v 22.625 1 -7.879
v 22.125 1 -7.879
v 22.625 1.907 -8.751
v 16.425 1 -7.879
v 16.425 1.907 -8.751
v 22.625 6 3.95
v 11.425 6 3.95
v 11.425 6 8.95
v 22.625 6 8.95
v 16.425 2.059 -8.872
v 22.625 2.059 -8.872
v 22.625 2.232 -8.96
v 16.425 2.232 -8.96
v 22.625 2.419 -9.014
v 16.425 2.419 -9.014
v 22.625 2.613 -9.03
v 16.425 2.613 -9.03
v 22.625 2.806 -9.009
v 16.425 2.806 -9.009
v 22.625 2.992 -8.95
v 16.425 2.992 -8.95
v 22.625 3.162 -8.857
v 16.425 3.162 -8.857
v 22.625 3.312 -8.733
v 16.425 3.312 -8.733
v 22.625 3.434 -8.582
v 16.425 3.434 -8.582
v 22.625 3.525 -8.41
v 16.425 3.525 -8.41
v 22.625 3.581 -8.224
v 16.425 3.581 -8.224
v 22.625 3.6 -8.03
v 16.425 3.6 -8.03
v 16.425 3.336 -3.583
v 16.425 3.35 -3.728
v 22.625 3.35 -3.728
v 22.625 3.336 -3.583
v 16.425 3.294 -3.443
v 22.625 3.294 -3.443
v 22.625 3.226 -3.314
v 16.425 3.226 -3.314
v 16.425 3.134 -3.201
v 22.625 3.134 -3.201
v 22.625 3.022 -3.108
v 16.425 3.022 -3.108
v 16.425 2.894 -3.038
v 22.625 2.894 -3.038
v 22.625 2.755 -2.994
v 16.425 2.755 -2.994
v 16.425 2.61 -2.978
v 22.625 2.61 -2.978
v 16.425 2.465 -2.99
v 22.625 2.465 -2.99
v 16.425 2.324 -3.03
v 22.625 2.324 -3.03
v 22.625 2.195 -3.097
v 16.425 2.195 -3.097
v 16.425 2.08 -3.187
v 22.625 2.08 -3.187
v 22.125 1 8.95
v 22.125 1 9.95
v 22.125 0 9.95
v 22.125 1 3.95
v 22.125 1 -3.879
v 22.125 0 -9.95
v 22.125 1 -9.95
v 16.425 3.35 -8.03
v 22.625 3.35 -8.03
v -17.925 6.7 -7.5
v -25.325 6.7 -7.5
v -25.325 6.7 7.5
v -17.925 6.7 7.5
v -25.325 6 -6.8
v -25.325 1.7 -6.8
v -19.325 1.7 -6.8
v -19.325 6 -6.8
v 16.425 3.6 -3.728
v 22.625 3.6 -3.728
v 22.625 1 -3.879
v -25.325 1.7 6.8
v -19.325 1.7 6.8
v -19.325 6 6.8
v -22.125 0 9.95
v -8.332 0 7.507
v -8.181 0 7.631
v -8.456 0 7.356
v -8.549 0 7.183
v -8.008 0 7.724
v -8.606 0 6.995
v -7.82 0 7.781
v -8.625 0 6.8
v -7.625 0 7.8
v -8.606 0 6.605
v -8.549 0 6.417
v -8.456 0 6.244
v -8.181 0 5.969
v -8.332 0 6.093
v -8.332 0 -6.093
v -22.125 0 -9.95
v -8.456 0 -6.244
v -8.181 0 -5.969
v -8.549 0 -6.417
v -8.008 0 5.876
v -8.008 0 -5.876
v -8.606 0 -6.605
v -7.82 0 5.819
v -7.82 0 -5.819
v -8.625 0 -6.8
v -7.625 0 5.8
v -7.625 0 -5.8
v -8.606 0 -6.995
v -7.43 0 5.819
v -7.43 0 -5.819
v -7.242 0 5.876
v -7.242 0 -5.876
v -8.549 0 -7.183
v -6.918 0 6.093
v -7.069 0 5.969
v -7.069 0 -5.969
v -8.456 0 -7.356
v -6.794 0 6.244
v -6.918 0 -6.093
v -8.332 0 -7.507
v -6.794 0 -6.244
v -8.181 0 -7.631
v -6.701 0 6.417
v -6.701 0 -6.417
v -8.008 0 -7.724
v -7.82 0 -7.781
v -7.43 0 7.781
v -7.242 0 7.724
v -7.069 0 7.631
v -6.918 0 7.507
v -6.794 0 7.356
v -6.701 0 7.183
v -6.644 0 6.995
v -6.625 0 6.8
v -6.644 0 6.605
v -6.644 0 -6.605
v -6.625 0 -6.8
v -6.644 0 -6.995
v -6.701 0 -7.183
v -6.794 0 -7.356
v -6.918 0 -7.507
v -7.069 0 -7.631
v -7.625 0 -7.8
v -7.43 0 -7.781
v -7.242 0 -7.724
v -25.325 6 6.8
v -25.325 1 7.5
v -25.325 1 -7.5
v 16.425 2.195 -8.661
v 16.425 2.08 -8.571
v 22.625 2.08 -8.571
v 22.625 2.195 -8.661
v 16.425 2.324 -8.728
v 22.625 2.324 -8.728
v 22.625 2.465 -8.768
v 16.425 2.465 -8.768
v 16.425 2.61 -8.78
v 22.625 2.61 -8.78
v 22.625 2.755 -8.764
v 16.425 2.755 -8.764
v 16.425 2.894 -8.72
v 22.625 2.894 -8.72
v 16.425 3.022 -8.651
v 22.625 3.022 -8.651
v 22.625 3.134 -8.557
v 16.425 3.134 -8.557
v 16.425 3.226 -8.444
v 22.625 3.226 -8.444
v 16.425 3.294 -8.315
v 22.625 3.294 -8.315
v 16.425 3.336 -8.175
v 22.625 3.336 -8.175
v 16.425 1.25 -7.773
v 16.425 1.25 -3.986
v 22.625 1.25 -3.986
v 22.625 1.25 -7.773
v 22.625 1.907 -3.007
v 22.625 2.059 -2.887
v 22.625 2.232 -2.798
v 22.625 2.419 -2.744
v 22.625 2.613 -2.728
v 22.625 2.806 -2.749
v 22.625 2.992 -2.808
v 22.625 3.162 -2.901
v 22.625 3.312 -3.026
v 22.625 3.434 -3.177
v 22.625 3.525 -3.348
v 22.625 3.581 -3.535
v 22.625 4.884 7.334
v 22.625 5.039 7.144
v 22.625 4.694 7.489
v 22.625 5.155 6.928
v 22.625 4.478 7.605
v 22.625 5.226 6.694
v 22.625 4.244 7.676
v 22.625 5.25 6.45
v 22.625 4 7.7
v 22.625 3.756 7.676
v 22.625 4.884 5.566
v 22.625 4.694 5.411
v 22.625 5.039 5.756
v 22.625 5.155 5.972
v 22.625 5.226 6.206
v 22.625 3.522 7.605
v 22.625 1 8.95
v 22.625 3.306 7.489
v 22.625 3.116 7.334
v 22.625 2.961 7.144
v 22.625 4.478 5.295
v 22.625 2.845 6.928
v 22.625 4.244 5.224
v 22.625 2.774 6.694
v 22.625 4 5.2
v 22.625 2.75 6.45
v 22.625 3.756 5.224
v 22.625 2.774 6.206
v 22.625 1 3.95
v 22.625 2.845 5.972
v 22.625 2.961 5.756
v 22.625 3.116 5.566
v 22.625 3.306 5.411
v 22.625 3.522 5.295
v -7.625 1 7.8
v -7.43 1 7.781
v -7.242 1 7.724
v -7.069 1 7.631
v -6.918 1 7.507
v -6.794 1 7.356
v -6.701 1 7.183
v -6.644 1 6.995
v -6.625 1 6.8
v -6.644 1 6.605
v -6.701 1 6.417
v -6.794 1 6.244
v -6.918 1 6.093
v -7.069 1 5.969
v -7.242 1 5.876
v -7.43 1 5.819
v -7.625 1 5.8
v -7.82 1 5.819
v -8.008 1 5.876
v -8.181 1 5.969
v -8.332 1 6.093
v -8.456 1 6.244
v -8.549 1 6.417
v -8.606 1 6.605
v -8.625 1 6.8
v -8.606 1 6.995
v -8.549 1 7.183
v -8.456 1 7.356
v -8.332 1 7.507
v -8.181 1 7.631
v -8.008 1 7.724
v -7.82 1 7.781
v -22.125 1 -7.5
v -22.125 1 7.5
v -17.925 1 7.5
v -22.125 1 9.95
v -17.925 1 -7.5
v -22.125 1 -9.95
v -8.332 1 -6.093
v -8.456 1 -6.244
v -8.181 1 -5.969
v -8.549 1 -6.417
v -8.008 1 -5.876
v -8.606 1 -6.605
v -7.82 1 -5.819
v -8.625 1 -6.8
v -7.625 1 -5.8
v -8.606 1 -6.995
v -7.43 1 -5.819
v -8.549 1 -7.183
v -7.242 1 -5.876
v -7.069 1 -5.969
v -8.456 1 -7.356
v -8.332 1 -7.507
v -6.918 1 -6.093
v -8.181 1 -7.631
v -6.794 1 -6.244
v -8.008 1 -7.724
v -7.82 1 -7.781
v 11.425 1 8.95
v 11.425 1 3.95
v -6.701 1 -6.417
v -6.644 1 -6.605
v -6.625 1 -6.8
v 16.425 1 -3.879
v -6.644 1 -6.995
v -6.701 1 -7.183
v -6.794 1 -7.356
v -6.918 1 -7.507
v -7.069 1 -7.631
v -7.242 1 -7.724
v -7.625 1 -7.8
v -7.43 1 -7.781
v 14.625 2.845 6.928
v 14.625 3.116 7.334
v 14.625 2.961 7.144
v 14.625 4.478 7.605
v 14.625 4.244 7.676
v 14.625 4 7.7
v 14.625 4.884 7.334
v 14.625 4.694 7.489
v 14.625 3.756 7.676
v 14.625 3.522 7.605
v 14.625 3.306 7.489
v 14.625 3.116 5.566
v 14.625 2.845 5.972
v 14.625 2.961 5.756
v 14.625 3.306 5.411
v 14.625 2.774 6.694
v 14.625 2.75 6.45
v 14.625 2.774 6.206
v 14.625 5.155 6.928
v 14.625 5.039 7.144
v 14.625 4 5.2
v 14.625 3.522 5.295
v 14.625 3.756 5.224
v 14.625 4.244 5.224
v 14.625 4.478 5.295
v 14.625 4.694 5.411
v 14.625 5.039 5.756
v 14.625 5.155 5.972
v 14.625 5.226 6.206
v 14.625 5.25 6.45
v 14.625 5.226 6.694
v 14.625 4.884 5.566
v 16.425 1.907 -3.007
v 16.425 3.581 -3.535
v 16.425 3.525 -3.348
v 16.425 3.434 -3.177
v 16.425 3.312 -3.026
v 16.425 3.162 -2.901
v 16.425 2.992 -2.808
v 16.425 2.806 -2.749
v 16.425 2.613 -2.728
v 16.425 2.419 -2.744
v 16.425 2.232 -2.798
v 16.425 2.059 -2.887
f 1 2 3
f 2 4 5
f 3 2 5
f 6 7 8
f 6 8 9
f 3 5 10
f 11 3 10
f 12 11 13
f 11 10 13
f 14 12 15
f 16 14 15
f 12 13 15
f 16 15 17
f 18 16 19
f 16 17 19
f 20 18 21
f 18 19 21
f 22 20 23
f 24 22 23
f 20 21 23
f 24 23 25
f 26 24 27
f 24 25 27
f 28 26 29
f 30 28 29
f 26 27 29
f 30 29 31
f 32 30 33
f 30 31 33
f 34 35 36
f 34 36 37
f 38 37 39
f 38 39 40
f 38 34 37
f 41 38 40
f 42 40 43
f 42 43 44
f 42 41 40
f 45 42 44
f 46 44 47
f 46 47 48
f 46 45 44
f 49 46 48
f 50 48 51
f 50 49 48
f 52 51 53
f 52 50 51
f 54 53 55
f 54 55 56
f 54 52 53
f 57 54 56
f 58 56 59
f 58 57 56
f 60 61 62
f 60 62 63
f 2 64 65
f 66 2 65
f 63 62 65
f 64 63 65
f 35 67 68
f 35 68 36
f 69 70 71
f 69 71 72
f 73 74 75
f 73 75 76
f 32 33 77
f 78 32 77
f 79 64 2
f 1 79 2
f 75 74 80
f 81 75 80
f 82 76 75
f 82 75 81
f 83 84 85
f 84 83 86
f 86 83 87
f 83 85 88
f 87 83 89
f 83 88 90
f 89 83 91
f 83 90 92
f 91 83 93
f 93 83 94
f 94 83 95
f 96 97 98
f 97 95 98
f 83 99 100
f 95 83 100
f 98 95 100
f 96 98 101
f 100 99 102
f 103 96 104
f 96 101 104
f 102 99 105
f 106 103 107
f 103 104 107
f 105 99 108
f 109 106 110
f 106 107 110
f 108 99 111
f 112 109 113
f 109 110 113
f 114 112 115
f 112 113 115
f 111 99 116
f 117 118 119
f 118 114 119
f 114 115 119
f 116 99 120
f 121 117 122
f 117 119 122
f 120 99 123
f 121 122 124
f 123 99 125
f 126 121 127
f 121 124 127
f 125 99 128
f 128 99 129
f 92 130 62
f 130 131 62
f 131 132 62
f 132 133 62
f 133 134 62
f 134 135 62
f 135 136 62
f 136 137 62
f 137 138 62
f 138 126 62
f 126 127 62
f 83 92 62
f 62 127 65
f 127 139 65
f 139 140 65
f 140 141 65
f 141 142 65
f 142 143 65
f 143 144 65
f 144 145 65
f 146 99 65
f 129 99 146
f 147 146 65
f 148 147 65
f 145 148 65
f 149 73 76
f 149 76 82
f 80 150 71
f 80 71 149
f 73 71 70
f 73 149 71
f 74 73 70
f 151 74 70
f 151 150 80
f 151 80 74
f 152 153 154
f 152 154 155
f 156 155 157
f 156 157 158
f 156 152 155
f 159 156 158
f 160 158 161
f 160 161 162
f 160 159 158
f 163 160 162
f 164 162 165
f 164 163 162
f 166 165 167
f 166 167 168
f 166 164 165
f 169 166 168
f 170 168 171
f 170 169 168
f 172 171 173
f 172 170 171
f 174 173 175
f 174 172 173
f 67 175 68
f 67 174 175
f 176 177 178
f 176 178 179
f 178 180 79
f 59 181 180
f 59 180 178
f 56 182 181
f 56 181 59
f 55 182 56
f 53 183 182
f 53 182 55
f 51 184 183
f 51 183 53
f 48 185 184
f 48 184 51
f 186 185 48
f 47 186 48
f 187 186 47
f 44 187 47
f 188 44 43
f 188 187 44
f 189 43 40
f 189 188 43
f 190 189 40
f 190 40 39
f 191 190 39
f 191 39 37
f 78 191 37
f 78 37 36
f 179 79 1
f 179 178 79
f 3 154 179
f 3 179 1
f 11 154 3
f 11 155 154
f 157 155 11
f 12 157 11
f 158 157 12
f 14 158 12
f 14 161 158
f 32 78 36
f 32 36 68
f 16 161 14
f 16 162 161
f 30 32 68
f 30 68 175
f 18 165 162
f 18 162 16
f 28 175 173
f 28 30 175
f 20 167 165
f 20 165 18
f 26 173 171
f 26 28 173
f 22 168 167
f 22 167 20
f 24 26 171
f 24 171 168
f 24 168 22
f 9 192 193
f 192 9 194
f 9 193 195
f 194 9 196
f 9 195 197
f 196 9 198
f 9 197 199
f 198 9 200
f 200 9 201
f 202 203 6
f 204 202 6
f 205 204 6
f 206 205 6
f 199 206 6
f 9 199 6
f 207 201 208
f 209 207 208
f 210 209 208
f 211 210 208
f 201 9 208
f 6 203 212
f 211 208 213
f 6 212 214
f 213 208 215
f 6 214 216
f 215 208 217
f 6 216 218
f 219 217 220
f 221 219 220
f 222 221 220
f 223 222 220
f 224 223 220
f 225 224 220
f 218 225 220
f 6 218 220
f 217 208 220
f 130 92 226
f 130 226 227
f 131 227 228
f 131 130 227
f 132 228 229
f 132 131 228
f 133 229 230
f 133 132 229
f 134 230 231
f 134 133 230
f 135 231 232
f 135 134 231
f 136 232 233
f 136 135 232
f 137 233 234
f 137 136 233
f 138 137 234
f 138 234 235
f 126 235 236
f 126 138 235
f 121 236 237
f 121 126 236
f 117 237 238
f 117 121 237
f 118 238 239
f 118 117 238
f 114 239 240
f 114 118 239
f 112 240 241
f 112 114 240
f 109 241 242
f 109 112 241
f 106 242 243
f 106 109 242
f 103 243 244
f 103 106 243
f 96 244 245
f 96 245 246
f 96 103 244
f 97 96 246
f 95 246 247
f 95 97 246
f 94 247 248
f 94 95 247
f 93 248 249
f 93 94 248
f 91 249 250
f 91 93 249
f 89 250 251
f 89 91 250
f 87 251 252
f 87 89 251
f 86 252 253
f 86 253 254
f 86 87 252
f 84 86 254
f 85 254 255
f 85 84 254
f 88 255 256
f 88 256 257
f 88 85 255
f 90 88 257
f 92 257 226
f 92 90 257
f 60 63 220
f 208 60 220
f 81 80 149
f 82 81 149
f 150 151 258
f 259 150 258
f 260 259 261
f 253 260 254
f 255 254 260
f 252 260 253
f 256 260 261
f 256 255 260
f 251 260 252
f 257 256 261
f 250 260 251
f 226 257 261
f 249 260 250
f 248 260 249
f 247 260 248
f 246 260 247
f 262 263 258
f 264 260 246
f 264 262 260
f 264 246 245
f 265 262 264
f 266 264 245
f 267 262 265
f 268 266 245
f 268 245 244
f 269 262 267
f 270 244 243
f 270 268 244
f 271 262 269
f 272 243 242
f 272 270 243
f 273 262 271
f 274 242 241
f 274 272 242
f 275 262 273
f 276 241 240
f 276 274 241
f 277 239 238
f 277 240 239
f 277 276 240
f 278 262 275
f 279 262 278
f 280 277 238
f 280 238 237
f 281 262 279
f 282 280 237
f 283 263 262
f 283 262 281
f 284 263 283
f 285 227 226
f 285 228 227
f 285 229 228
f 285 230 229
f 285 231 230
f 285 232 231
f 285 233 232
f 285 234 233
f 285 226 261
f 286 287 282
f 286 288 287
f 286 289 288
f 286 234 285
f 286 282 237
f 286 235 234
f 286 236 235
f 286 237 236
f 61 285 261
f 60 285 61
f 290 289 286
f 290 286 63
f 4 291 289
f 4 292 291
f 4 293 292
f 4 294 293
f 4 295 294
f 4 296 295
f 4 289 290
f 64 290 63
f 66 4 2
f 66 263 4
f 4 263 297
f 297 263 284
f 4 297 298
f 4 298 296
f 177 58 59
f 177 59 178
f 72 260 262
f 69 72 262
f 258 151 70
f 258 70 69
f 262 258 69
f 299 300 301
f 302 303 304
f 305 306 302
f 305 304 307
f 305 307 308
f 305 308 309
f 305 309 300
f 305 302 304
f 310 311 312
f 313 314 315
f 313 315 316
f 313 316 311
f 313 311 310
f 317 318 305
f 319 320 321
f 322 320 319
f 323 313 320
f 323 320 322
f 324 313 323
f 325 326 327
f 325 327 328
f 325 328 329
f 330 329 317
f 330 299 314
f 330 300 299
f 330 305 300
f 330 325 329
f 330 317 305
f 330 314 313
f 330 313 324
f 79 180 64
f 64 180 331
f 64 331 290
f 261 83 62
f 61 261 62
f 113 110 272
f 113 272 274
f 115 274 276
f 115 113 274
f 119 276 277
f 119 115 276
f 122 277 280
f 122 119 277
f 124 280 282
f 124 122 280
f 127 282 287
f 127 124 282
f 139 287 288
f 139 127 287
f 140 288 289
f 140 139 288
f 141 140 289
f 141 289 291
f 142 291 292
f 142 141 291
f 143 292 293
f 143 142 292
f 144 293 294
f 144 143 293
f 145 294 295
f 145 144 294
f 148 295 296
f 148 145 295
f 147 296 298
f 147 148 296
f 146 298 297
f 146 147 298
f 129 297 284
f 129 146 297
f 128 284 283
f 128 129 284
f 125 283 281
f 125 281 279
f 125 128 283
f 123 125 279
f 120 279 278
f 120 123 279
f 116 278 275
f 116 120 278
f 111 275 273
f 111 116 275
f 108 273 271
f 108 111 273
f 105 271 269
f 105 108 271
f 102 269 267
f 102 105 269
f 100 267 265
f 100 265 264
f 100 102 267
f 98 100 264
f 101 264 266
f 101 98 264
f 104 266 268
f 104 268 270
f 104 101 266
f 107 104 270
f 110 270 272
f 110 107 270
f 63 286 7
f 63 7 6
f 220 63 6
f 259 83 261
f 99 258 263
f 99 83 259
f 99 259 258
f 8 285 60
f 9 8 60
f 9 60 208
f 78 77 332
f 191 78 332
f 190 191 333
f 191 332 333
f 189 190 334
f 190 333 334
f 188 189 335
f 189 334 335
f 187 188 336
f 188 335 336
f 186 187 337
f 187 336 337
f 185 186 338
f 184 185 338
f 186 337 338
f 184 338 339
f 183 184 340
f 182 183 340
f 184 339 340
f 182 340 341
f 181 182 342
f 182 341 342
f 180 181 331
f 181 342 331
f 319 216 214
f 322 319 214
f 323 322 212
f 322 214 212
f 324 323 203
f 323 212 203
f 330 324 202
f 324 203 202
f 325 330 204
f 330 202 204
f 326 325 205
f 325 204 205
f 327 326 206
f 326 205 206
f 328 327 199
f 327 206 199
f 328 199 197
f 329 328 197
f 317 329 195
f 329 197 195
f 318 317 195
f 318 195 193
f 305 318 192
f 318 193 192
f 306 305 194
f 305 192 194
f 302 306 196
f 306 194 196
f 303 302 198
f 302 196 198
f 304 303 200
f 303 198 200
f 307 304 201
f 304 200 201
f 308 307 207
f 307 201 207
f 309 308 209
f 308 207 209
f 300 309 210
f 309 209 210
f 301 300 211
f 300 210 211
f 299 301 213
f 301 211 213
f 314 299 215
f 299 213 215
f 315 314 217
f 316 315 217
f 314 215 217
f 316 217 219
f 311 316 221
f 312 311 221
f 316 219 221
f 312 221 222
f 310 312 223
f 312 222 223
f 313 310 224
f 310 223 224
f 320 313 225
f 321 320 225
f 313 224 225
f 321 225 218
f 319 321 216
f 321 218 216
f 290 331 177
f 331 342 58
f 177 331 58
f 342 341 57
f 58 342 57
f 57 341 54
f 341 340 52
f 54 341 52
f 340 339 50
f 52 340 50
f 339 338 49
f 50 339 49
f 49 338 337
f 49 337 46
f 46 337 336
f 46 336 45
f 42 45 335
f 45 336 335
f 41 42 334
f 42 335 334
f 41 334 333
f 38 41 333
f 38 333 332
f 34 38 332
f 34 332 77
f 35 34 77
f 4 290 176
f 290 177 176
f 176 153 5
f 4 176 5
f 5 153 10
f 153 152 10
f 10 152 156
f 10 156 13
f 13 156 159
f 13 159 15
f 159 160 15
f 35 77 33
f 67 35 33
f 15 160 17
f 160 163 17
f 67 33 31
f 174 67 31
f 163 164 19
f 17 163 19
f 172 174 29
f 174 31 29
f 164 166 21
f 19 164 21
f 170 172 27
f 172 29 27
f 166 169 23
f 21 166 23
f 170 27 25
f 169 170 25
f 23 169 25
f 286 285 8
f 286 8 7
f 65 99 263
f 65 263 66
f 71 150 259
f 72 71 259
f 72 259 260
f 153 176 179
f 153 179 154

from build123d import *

# Parameters (mm, degrees)
SKETCH1_W                = 44.25
SKETCH1_H                = 19.9
SKETCH1_R                = 1
BOSS_EXTRUDE1_DEPTH      = 1
SKETCH2_W                = 7.4
SKETCH2_H                = 15
BOSS_EXTRUDE2_DEPTH      = 5.7
SKETCH3_W                = 13.6
SKETCH3_H                = 4.3
CUT_EXTRUDE1_DEPTH       = 6
SKETCH4_W                = 11.2
SKETCH4_H                = 5
BOSS_EXTRUDE3_DEPTH      = 5
SKETCH5_R                = 1.25
CUT_EXTRUDE2_DEPTH       = 8
BOSS_EXTRUDE4_DEPTH      = 0.5
BOSS_EXTRUDE4_DEPTH_BACK = 5.7


with BuildPart() as part:
    # Sketch1 → Boss-Extrude1 (new body)
    with BuildSketch(Plane(origin=(0, 0, 0), x_dir=(1, 0, 0), z_dir=(0, 1, 0))):
        Rectangle(SKETCH1_W, SKETCH1_H)
        with Locations(Location((-7.625, 6.8, 0), (0, 0, 270))):
            Circle(SKETCH1_R, mode=Mode.SUBTRACT)
        with Locations(Location((-7.625, -6.8, 0), (0, 0, 270))):
            Circle(SKETCH1_R, mode=Mode.SUBTRACT)
    extrude(amount=BOSS_EXTRUDE1_DEPTH)

    # Sketch2 → Boss-Extrude2 (add)
    with BuildSketch(Plane(origin=(0, 1, 0), x_dir=(1, 0, 0), z_dir=(0, 1, 0))):
        with Locations((-21.625, 0)):
            Rectangle(SKETCH2_W, SKETCH2_H)
    extrude(amount=BOSS_EXTRUDE2_DEPTH)

    # Sketch3 → Cut-Extrude1 (cut)
    with BuildSketch(Plane.ZY.offset(25.325)):
        with Locations((0, 3.85)):
            Rectangle(SKETCH3_W, SKETCH3_H)
    extrude(amount=-CUT_EXTRUDE1_DEPTH, mode=Mode.SUBTRACT)

    # Sketch4 → Boss-Extrude3 (add)
    with BuildSketch(Plane(origin=(0, 1, 0), x_dir=(1, 0, 0), z_dir=(0, 1, 0))):
        with Locations((17.025, -6.45)):
            Rectangle(SKETCH4_W, SKETCH4_H)
    extrude(amount=BOSS_EXTRUDE3_DEPTH)

    # Sketch5 → Cut-Extrude2 (cut)
    with BuildSketch(Plane(origin=(22.625, 0, 0), x_dir=(0, 0, -1), z_dir=(1, 0, 0))):
        with Locations((-6.45, 4)):
            Circle(SKETCH5_R)
    extrude(amount=-CUT_EXTRUDE2_DEPTH, mode=Mode.SUBTRACT)

    # Sketch6 → Boss-Extrude4 (add, two sides: drawn at the far end of the back side and taken through both)
    with BuildSketch(Plane(origin=(22.125, 0, 0), x_dir=(0, 0, -1), z_dir=(1, 0, 0)).offset(-BOSS_EXTRUDE4_DEPTH_BACK)):
        with BuildLine():
            Line((3.879166952, 1), (7.879166952, 1))
            Line((7.879166952, 1), (8.751177801, 1.906891284))
            ThreePointArc((8.751177801, 1.906891284), (8.950428623, 2.991721383), (8.030344737, 3.6))
            Line((8.030344737, 3.6), (3.727989167, 3.6))
            ThreePointArc((3.727989167, 3.6), (2.80790528, 2.991721383), (3.007156102, 1.906891284))
            Line((3.007156102, 1.906891284), (3.879166952, 1))
        make_face()
        with BuildLine():
            Line((3.985603275, 1.25), (7.772730629, 1.25))
            Line((7.772730629, 1.25), (8.570969535, 2.080168463))
            ThreePointArc((8.570969535, 2.080168463), (8.720407651, 2.893791037), (8.030344737, 3.35))
            Line((8.030344737, 3.35), (3.727989167, 3.35))
            ThreePointArc((3.727989167, 3.35), (3.037926252, 2.893791037), (3.187364368, 2.080168463))
            Line((3.187364368, 2.080168463), (3.985603275, 1.25))
        make_face(mode=Mode.SUBTRACT)
    extrude(amount=BOSS_EXTRUDE4_DEPTH + BOSS_EXTRUDE4_DEPTH_BACK)


solid = part.part
